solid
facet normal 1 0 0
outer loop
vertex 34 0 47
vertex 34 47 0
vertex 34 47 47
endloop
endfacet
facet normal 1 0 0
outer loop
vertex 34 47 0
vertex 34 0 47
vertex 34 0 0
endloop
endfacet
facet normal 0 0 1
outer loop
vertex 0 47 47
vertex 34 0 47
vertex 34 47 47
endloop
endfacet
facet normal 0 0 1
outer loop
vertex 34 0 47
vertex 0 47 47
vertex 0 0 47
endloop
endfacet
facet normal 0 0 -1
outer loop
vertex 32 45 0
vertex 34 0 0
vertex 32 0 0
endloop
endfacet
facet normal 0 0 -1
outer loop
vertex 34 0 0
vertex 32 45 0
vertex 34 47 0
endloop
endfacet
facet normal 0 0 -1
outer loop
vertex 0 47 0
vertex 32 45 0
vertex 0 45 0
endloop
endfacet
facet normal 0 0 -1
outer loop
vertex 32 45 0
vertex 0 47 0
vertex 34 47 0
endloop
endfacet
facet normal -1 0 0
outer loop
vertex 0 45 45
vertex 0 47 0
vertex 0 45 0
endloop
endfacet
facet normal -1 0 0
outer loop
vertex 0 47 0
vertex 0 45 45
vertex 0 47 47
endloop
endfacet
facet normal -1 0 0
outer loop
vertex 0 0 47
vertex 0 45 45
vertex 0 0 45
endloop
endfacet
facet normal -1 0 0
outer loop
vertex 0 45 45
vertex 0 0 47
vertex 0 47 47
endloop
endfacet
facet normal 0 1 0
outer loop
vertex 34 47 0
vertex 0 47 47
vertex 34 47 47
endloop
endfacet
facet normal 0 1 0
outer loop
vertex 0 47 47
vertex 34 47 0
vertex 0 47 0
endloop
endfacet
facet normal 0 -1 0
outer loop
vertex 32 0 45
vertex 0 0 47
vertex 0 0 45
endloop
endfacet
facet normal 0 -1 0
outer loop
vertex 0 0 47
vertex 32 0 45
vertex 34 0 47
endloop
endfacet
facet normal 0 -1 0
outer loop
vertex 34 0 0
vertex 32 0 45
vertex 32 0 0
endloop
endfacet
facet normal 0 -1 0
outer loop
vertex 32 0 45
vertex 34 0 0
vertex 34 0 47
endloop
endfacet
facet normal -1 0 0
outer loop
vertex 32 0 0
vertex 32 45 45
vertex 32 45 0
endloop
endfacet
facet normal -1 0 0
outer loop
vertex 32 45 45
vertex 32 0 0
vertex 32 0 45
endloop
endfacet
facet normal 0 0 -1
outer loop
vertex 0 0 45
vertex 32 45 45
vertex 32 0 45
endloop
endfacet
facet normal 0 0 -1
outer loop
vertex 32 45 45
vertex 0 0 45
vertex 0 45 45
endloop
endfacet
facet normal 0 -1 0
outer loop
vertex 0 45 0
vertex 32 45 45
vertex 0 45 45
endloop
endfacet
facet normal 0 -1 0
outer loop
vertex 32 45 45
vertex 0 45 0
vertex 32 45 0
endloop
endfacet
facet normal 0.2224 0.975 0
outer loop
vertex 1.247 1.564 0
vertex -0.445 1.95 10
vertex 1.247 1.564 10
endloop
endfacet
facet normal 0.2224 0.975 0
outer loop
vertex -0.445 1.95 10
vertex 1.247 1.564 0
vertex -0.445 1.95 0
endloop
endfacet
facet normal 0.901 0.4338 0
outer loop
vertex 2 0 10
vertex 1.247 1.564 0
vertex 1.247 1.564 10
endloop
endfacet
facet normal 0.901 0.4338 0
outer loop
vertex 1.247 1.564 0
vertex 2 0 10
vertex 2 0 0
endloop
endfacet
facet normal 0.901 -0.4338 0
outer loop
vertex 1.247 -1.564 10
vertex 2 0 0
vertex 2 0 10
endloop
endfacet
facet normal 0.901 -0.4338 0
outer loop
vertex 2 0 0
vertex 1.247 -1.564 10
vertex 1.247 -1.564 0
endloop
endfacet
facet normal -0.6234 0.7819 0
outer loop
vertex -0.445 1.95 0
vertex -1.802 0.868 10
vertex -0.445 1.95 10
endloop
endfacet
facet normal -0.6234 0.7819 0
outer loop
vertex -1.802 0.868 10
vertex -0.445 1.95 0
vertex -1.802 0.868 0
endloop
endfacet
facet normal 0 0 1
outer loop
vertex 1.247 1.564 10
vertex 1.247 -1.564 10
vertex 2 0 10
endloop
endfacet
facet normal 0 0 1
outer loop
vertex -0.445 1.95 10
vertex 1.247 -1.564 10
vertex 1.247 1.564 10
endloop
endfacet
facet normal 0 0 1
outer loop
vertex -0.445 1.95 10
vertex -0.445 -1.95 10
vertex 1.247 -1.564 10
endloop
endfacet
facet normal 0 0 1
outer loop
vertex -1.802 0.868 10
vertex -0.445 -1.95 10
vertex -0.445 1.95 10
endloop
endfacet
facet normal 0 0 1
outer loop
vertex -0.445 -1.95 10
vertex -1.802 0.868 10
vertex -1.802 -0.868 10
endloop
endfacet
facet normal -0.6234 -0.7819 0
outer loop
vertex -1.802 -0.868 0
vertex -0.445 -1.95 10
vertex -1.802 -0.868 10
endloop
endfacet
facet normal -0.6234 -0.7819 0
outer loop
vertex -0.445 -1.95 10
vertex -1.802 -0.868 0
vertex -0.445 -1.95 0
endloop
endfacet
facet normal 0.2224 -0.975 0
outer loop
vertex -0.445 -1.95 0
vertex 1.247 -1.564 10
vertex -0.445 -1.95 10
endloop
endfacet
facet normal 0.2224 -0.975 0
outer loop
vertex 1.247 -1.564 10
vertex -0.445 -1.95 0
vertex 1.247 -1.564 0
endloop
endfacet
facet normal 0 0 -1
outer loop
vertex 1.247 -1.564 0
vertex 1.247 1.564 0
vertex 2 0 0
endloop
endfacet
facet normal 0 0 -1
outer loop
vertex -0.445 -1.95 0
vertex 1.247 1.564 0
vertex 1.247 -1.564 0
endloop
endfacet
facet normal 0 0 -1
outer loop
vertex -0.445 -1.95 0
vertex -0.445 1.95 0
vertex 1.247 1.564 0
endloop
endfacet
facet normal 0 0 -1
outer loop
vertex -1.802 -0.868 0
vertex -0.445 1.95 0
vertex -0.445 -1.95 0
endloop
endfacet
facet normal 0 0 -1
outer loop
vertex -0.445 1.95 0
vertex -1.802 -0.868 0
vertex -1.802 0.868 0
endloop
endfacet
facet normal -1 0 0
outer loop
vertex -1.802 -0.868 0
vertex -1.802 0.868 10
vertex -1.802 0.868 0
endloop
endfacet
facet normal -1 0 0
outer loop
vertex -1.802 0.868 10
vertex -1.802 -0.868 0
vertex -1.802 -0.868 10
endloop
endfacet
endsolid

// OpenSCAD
difference() {
translate(1,1,1) {cube(size = [34,47,47]);}
cube(size = [32,45,45]);
}
cylinder(h = 10, r=2);
